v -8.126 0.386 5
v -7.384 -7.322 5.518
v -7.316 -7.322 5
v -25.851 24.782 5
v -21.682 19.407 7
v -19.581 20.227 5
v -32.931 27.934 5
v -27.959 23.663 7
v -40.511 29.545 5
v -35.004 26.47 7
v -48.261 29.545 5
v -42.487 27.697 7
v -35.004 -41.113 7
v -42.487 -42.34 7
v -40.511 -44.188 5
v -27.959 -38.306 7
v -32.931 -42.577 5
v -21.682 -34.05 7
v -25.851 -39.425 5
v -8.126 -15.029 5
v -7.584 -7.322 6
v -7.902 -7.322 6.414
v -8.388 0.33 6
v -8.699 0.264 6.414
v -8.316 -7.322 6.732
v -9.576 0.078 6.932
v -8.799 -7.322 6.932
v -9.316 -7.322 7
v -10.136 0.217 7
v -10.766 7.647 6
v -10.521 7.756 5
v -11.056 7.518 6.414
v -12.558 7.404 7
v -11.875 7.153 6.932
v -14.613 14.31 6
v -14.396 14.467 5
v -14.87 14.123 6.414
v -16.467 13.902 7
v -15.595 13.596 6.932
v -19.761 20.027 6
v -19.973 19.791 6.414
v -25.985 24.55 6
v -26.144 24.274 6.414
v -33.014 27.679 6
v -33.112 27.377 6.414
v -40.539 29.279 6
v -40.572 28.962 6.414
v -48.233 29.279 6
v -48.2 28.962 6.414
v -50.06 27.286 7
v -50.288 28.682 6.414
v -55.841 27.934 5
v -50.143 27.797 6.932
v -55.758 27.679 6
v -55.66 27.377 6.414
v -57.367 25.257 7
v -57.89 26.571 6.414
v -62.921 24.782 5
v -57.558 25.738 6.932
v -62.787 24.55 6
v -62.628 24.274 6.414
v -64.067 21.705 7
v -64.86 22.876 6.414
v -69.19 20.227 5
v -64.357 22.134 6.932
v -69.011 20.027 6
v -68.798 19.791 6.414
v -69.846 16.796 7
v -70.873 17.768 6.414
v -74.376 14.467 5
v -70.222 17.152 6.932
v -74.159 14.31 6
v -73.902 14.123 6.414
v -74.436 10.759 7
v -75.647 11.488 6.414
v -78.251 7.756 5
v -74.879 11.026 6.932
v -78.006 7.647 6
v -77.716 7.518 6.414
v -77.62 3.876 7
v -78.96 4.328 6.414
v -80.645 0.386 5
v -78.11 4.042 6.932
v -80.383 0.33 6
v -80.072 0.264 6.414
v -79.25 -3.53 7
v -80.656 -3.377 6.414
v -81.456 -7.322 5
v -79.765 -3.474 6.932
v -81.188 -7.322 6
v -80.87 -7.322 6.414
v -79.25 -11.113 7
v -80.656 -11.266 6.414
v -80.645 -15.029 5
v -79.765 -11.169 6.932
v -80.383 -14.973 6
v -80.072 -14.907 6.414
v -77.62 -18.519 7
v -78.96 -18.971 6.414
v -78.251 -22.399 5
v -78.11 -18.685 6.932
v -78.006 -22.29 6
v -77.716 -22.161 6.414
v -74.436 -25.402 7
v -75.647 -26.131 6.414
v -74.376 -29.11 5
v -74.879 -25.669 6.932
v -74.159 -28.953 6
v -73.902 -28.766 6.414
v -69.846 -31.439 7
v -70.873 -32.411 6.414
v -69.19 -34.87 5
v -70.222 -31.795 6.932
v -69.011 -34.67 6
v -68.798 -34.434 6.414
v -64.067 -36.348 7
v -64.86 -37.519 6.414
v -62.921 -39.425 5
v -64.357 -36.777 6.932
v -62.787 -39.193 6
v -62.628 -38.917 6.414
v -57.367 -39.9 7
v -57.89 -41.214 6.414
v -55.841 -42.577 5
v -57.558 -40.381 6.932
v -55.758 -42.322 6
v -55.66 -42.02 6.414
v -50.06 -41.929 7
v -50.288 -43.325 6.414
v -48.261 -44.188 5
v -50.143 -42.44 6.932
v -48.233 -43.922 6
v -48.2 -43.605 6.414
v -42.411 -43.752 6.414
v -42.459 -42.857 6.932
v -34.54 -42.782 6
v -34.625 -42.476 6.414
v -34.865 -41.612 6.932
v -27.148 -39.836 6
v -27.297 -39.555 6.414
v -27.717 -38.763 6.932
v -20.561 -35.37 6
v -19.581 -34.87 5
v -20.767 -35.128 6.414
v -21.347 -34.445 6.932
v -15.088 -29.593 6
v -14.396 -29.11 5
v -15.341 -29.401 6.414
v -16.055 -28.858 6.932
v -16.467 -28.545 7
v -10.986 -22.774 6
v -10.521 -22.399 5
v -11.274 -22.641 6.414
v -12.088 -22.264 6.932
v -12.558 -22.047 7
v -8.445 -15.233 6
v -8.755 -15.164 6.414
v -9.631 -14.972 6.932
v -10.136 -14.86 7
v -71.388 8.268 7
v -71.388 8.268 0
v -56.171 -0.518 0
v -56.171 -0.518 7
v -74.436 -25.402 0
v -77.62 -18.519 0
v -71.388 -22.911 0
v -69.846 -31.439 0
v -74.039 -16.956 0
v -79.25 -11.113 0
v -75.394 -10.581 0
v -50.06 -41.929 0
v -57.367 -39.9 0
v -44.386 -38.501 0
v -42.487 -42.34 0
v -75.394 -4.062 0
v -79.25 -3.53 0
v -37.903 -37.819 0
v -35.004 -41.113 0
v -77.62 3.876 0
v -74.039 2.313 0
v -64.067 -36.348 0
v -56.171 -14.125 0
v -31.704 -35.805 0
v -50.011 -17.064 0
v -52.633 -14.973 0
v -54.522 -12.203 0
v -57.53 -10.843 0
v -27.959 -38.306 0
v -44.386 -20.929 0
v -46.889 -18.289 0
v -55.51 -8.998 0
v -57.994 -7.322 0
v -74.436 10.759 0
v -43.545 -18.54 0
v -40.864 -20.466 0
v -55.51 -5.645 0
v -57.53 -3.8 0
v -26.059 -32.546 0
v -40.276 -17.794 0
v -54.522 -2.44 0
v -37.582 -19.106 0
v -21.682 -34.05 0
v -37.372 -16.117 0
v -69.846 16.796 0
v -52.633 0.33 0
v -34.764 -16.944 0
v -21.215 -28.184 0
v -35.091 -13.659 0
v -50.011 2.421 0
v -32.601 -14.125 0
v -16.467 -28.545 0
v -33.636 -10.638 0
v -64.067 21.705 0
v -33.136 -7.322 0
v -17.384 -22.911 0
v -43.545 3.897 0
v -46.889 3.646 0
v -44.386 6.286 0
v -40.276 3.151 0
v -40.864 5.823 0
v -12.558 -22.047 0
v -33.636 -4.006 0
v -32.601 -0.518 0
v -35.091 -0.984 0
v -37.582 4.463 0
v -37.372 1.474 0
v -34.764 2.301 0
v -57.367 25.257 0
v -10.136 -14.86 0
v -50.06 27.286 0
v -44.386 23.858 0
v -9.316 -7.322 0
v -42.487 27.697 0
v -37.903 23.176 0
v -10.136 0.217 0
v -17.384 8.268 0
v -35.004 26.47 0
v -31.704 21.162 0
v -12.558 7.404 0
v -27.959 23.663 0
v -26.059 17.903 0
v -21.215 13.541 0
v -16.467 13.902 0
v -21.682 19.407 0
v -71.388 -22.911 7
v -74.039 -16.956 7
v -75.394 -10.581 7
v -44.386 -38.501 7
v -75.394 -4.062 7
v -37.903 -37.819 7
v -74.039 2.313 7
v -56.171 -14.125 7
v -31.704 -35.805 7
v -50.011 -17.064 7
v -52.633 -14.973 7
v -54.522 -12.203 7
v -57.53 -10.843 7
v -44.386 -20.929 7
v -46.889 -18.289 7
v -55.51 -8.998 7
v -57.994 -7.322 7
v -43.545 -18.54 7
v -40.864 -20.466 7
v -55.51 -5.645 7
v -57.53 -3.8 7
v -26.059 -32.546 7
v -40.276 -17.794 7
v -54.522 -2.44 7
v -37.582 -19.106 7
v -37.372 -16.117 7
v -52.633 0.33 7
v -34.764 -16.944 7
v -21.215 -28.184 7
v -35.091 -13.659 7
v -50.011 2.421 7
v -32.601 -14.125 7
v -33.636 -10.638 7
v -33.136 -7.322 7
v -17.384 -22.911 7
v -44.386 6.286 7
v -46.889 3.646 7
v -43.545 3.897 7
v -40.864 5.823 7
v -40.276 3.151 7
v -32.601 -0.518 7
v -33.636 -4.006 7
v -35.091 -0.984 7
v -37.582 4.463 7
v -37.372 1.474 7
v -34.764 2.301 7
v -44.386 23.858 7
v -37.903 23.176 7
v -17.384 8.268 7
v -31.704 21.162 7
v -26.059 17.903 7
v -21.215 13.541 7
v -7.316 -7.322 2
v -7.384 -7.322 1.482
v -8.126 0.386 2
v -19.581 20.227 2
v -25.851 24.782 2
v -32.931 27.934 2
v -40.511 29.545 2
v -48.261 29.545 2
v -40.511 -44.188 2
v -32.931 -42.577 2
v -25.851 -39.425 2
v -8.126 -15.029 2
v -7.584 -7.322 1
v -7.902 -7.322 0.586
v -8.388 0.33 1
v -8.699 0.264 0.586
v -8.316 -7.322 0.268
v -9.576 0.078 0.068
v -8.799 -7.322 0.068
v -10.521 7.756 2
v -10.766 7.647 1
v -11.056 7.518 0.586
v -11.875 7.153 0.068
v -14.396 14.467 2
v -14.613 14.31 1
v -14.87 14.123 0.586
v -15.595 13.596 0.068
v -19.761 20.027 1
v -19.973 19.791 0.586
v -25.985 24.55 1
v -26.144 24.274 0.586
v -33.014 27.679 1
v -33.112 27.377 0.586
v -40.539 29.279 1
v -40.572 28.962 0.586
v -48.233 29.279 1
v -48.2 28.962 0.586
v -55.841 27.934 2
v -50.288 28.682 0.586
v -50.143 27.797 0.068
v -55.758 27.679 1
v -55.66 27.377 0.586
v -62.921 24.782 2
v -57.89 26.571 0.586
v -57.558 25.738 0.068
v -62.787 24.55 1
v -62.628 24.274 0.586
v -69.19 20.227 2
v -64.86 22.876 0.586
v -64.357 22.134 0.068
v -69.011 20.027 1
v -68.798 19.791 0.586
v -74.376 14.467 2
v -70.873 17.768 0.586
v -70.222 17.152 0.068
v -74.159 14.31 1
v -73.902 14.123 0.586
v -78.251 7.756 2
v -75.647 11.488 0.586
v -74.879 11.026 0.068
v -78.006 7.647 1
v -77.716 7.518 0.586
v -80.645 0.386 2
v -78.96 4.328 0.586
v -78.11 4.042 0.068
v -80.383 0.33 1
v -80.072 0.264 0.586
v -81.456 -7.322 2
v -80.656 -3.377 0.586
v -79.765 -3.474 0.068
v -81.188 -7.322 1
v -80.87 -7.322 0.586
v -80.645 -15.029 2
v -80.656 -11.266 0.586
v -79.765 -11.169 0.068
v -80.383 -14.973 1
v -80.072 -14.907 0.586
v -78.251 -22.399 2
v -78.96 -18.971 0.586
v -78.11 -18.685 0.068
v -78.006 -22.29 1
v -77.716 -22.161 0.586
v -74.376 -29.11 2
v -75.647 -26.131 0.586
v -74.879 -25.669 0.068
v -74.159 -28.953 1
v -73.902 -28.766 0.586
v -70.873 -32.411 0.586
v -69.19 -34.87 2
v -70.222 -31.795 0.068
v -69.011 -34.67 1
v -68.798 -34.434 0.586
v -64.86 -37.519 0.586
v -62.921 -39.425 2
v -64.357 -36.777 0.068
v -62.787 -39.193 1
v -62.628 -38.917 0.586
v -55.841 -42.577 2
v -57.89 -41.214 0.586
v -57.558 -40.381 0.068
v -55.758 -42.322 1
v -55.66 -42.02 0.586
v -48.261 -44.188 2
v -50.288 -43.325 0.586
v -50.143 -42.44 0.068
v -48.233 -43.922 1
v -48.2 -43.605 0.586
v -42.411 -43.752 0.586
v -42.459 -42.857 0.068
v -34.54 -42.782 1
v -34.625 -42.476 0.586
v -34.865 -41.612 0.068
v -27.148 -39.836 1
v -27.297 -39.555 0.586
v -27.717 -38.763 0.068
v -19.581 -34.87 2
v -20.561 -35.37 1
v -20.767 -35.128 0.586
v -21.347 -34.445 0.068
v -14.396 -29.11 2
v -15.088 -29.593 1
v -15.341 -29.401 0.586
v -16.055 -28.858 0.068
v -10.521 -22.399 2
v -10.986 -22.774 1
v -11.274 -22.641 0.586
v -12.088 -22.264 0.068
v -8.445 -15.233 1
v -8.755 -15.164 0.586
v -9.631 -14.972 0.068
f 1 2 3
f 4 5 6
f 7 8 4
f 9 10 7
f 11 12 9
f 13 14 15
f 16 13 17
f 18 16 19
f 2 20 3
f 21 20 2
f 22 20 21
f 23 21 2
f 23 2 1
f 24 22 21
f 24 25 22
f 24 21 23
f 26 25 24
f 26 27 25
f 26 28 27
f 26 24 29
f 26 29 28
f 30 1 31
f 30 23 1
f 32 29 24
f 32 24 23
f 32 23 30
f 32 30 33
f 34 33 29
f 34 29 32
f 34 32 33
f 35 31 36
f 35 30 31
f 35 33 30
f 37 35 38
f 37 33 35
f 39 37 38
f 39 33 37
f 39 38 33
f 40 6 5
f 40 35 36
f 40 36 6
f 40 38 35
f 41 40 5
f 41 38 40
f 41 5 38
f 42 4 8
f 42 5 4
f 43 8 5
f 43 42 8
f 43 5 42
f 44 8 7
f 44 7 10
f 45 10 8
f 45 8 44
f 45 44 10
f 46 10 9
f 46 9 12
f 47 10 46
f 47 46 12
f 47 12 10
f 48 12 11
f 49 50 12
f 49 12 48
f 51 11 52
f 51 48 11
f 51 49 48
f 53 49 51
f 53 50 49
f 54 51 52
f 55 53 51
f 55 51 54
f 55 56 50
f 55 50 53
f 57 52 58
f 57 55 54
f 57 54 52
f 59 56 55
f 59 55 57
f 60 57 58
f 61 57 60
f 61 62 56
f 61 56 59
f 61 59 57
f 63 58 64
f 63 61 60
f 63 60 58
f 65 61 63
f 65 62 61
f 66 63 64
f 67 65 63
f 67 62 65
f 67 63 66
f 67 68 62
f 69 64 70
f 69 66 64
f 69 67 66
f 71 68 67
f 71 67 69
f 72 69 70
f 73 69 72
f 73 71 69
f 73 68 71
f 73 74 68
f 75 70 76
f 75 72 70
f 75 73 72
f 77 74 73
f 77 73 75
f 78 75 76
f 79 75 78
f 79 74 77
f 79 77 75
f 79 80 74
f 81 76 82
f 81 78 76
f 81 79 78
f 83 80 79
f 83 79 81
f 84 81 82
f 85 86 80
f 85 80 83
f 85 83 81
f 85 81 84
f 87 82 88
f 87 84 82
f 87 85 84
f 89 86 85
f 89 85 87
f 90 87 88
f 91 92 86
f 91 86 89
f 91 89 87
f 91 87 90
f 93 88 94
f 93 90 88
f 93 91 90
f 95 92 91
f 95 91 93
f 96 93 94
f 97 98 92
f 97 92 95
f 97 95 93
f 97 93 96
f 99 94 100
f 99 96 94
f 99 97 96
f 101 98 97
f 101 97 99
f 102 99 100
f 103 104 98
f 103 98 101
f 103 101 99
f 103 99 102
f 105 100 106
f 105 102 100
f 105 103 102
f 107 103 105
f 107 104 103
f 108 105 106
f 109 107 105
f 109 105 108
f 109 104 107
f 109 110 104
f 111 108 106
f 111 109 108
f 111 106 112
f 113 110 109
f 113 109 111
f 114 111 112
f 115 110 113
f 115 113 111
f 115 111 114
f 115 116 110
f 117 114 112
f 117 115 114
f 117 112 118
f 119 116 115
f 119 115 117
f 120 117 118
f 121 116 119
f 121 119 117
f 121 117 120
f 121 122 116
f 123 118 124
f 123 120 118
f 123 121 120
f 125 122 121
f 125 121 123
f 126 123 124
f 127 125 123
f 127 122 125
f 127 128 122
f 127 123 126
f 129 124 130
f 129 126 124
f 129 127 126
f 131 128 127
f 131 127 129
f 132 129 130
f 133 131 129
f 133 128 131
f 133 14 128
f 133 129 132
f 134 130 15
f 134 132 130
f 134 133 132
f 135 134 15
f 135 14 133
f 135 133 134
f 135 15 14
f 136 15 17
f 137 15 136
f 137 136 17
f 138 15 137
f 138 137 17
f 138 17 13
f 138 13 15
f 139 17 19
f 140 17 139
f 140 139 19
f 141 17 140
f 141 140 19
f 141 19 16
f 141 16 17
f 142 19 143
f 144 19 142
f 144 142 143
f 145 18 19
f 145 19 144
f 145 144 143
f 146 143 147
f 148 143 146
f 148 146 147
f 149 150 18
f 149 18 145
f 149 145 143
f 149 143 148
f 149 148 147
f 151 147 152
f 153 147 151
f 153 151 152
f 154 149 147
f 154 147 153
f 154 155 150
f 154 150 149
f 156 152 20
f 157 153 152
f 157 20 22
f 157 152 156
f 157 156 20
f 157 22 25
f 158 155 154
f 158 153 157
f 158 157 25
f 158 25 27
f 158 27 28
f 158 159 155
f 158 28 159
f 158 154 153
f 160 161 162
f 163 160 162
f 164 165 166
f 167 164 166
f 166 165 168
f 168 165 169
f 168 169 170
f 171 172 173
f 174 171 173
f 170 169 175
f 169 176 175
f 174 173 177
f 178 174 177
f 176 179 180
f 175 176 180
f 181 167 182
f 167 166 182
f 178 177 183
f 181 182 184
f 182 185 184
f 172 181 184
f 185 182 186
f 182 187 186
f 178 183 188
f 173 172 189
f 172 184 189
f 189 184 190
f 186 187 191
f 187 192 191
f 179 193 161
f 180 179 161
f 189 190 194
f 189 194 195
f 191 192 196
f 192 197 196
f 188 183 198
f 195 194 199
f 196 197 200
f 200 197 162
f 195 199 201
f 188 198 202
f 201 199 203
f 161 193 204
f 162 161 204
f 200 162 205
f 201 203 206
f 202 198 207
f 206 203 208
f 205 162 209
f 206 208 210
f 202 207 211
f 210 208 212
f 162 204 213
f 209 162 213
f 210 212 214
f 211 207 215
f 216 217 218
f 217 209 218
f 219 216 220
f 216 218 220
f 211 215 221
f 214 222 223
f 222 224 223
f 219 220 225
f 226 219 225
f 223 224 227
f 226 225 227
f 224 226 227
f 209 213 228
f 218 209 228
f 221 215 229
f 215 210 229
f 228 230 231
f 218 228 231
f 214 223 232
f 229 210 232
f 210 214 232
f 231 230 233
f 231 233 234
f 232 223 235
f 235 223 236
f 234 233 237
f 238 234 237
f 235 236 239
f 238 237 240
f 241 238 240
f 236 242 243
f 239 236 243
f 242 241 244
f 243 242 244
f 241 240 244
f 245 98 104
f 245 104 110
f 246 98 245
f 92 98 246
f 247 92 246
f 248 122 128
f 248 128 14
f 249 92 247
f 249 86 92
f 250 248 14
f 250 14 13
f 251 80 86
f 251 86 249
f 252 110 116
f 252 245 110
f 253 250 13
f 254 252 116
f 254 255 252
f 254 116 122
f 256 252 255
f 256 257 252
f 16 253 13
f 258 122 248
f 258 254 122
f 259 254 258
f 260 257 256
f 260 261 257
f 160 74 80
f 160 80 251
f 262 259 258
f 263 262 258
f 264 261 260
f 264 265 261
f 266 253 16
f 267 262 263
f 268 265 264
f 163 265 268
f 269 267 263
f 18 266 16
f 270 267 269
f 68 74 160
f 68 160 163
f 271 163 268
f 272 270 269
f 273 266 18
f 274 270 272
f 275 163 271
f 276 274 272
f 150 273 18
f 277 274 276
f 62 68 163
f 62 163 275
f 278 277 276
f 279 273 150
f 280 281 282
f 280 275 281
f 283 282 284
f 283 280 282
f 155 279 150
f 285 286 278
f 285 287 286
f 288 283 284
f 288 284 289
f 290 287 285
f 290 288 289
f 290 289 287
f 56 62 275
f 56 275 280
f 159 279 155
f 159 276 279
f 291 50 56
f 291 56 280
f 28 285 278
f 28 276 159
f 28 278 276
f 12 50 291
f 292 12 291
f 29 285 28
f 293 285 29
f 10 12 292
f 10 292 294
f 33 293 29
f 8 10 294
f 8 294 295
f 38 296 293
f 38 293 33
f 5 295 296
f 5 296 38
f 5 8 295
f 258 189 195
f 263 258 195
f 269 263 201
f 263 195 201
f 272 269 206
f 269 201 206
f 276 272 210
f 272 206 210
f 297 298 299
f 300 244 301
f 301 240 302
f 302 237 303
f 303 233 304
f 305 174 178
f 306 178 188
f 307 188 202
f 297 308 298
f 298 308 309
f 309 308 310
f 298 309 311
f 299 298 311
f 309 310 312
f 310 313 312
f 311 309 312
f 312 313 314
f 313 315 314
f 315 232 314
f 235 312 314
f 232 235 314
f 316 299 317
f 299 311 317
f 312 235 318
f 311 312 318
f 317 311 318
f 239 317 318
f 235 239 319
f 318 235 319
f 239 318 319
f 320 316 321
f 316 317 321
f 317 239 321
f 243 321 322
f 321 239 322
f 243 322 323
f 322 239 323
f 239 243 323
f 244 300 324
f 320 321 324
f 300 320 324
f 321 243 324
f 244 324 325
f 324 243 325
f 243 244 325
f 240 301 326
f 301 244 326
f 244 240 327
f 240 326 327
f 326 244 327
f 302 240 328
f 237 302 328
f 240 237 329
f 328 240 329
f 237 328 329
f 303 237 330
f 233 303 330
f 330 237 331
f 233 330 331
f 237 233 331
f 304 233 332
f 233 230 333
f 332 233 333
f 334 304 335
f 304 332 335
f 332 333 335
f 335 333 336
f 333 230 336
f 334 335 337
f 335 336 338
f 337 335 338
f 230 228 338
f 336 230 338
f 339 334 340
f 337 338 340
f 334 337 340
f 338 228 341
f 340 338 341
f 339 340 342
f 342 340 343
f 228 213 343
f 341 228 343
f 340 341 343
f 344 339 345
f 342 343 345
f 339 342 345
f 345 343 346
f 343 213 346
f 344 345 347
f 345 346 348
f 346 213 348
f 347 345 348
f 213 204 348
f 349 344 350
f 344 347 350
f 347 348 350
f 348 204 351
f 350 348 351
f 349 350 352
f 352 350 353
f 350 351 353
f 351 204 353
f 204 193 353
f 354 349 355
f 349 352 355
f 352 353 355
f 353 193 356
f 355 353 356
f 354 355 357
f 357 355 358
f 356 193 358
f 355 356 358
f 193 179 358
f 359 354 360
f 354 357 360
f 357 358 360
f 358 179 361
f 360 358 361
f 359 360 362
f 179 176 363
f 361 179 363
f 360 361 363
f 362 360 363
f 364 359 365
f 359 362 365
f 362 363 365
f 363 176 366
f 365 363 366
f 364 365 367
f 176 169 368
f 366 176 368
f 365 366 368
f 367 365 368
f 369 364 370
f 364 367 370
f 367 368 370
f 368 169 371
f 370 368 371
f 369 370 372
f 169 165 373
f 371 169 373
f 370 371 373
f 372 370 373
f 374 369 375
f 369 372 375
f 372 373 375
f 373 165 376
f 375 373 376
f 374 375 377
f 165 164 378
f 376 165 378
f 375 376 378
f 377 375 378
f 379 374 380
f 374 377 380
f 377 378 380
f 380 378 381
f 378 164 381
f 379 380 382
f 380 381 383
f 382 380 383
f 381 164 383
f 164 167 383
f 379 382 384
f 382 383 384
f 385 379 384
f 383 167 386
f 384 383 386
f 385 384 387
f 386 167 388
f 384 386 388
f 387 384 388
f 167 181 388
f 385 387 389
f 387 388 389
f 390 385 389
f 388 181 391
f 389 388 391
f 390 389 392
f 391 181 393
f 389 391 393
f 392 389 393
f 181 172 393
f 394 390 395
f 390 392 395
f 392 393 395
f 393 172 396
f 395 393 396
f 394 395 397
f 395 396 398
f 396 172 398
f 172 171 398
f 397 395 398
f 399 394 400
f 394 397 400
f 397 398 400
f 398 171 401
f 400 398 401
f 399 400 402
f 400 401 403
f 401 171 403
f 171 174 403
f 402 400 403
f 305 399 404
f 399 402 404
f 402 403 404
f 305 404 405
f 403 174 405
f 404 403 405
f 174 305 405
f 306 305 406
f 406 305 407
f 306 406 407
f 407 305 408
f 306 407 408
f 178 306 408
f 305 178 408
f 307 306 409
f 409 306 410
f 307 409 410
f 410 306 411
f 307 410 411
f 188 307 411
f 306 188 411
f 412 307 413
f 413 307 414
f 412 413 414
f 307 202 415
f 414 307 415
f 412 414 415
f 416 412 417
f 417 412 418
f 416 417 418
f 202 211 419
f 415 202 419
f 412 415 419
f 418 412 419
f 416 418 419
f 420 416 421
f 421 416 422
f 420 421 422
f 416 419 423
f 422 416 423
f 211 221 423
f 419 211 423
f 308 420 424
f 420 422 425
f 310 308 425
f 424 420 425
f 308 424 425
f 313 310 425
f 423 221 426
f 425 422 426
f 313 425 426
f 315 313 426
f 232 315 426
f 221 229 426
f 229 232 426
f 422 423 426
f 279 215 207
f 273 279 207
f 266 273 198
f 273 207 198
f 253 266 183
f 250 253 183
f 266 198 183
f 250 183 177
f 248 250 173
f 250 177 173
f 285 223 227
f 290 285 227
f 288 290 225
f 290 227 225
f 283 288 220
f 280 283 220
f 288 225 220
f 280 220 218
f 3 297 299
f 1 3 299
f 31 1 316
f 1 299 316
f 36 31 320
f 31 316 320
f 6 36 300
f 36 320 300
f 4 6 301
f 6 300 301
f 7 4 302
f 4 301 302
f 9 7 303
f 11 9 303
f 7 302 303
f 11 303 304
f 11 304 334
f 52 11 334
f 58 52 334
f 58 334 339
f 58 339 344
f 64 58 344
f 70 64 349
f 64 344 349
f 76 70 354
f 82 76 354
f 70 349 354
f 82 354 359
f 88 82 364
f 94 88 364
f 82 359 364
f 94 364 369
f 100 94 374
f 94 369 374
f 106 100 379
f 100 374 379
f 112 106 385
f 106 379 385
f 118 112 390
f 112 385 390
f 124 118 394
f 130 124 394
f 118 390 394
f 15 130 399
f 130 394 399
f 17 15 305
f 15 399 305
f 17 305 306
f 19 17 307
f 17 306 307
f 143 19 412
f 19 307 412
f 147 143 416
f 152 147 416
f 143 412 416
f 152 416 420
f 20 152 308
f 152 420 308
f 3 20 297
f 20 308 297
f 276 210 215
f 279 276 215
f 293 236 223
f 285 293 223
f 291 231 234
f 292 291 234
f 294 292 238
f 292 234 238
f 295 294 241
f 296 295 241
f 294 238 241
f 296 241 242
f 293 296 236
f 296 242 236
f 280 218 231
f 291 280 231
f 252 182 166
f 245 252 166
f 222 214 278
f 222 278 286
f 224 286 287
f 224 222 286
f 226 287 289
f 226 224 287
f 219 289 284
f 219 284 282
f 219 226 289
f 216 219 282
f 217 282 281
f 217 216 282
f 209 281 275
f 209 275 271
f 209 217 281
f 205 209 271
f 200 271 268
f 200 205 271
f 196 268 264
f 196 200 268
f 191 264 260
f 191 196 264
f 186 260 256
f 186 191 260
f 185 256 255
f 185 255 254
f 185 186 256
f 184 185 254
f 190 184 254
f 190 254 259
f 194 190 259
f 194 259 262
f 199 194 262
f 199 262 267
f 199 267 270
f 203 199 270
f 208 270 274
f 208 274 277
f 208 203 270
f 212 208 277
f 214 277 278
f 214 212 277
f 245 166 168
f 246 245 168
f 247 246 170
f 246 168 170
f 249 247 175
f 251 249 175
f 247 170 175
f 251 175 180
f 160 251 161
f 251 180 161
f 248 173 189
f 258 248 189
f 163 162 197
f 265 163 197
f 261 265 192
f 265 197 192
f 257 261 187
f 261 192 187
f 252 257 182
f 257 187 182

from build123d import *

# Parameters (mm, degrees)
F0_R     = 37.06963
F0_R_2   = 11.25
F1_DEPTH = 7
F2_R     = 2


with BuildPart() as f1:
    # F0 (on Top) → F1 (new body)
    with BuildSketch(Plane.XY):
        with Locations((-44.385914, -7.321505)):
            Circle(F0_R)
        with BuildLine():
            ThreePointArc((-17.383998, 8.268058), (-14.26919, 0.748247), (-13.206787, -7.321505))
            ThreePointArc((-13.206787, -7.321505), (-14.26919, -15.391257), (-17.383998, -22.911069))
            ThreePointArc((-17.383998, -22.911069), (-28.79635, -34.323421), (-44.385914, -38.500632))
            ThreePointArc((-44.385914, -38.500632), (-59.975477, -34.323421), (-71.38783, -22.911069))
            ThreePointArc((-71.38783, -22.911069), (-75.565041, -7.321505), (-71.38783, 8.268058))
            ThreePointArc((-71.38783, 8.268058), (-59.975477, 19.680411), (-44.385914, 23.857622))
            ThreePointArc((-44.385914, 23.857622), (-28.79635, 19.680411), (-17.383998, 8.268058))
        make_face(mode=Mode.SUBTRACT)
        with BuildLine():
            ThreePointArc((-30.778047, -7.321505), (-31.241724, -3.79953), (-32.601156, -0.517572))
            ThreePointArc((-32.601156, -0.517572), (-37.581981, 4.463253), (-44.385914, 6.286361))
            ThreePointArc((-44.385914, 6.286361), (-51.189847, 4.463253), (-56.170672, -0.517572))
            ThreePointArc((-56.170672, -0.517572), (-57.99378, -7.321505), (-56.170672, -14.125438))
            ThreePointArc((-56.170672, -14.125438), (-51.189847, -19.106263), (-44.385914, -20.929372))
            ThreePointArc((-44.385914, -20.929372), (-37.581981, -19.106263), (-32.601156, -14.125438))
            ThreePointArc((-32.601156, -14.125438), (-31.241724, -10.84348), (-30.778047, -7.321505))
        make_face()
        with Locations((-44.385914, -7.321505)):
            Circle(F0_R_2, mode=Mode.SUBTRACT)
        with BuildLine():
            ThreePointArc((-71.38783, -22.911069), (-59.975477, -34.323421), (-44.385914, -38.500632))
            Line((-44.385914, -38.500632), (-44.385914, -20.929372))
            ThreePointArc((-44.385914, -20.929372), (-51.189847, -19.106263), (-56.170672, -14.125438))
            Line((-56.170672, -14.125438), (-71.38783, -22.911069))
        make_face()
        with BuildLine():
            Line((-44.385914, 6.286361), (-44.385914, 23.857622))
            ThreePointArc((-44.385914, 23.857622), (-59.975477, 19.680411), (-71.38783, 8.268058))
            Line((-71.38783, 8.268058), (-56.170672, -0.517572))
            ThreePointArc((-56.170672, -0.517572), (-51.189847, 4.463253), (-44.385914, 6.286361))
        make_face()
        with BuildLine():
            ThreePointArc((-17.383998, -22.911069), (-14.26919, -15.391257), (-13.206787, -7.321505))
            ThreePointArc((-13.206787, -7.321505), (-14.26919, 0.748247), (-17.383998, 8.268058))
            Line((-17.383998, 8.268058), (-32.601156, -0.517572))
            ThreePointArc((-32.601156, -0.517572), (-31.241724, -3.79953), (-30.778047, -7.321505))
            ThreePointArc((-30.778047, -7.321505), (-31.241724, -10.84348), (-32.601156, -14.125438))
            Line((-32.601156, -14.125438), (-17.383998, -22.911069))
        make_face()
    extrude(amount=F1_DEPTH)

    # F2
    f2_edges = [f1.edges().sort_by_distance(p)[0] for p in [
        (-81.455544, -7.321505, 0),
        (-81.455544, -7.321505, 7),
    ]]
    fillet(f2_edges, radius=F2_R)


solid = f1.part
